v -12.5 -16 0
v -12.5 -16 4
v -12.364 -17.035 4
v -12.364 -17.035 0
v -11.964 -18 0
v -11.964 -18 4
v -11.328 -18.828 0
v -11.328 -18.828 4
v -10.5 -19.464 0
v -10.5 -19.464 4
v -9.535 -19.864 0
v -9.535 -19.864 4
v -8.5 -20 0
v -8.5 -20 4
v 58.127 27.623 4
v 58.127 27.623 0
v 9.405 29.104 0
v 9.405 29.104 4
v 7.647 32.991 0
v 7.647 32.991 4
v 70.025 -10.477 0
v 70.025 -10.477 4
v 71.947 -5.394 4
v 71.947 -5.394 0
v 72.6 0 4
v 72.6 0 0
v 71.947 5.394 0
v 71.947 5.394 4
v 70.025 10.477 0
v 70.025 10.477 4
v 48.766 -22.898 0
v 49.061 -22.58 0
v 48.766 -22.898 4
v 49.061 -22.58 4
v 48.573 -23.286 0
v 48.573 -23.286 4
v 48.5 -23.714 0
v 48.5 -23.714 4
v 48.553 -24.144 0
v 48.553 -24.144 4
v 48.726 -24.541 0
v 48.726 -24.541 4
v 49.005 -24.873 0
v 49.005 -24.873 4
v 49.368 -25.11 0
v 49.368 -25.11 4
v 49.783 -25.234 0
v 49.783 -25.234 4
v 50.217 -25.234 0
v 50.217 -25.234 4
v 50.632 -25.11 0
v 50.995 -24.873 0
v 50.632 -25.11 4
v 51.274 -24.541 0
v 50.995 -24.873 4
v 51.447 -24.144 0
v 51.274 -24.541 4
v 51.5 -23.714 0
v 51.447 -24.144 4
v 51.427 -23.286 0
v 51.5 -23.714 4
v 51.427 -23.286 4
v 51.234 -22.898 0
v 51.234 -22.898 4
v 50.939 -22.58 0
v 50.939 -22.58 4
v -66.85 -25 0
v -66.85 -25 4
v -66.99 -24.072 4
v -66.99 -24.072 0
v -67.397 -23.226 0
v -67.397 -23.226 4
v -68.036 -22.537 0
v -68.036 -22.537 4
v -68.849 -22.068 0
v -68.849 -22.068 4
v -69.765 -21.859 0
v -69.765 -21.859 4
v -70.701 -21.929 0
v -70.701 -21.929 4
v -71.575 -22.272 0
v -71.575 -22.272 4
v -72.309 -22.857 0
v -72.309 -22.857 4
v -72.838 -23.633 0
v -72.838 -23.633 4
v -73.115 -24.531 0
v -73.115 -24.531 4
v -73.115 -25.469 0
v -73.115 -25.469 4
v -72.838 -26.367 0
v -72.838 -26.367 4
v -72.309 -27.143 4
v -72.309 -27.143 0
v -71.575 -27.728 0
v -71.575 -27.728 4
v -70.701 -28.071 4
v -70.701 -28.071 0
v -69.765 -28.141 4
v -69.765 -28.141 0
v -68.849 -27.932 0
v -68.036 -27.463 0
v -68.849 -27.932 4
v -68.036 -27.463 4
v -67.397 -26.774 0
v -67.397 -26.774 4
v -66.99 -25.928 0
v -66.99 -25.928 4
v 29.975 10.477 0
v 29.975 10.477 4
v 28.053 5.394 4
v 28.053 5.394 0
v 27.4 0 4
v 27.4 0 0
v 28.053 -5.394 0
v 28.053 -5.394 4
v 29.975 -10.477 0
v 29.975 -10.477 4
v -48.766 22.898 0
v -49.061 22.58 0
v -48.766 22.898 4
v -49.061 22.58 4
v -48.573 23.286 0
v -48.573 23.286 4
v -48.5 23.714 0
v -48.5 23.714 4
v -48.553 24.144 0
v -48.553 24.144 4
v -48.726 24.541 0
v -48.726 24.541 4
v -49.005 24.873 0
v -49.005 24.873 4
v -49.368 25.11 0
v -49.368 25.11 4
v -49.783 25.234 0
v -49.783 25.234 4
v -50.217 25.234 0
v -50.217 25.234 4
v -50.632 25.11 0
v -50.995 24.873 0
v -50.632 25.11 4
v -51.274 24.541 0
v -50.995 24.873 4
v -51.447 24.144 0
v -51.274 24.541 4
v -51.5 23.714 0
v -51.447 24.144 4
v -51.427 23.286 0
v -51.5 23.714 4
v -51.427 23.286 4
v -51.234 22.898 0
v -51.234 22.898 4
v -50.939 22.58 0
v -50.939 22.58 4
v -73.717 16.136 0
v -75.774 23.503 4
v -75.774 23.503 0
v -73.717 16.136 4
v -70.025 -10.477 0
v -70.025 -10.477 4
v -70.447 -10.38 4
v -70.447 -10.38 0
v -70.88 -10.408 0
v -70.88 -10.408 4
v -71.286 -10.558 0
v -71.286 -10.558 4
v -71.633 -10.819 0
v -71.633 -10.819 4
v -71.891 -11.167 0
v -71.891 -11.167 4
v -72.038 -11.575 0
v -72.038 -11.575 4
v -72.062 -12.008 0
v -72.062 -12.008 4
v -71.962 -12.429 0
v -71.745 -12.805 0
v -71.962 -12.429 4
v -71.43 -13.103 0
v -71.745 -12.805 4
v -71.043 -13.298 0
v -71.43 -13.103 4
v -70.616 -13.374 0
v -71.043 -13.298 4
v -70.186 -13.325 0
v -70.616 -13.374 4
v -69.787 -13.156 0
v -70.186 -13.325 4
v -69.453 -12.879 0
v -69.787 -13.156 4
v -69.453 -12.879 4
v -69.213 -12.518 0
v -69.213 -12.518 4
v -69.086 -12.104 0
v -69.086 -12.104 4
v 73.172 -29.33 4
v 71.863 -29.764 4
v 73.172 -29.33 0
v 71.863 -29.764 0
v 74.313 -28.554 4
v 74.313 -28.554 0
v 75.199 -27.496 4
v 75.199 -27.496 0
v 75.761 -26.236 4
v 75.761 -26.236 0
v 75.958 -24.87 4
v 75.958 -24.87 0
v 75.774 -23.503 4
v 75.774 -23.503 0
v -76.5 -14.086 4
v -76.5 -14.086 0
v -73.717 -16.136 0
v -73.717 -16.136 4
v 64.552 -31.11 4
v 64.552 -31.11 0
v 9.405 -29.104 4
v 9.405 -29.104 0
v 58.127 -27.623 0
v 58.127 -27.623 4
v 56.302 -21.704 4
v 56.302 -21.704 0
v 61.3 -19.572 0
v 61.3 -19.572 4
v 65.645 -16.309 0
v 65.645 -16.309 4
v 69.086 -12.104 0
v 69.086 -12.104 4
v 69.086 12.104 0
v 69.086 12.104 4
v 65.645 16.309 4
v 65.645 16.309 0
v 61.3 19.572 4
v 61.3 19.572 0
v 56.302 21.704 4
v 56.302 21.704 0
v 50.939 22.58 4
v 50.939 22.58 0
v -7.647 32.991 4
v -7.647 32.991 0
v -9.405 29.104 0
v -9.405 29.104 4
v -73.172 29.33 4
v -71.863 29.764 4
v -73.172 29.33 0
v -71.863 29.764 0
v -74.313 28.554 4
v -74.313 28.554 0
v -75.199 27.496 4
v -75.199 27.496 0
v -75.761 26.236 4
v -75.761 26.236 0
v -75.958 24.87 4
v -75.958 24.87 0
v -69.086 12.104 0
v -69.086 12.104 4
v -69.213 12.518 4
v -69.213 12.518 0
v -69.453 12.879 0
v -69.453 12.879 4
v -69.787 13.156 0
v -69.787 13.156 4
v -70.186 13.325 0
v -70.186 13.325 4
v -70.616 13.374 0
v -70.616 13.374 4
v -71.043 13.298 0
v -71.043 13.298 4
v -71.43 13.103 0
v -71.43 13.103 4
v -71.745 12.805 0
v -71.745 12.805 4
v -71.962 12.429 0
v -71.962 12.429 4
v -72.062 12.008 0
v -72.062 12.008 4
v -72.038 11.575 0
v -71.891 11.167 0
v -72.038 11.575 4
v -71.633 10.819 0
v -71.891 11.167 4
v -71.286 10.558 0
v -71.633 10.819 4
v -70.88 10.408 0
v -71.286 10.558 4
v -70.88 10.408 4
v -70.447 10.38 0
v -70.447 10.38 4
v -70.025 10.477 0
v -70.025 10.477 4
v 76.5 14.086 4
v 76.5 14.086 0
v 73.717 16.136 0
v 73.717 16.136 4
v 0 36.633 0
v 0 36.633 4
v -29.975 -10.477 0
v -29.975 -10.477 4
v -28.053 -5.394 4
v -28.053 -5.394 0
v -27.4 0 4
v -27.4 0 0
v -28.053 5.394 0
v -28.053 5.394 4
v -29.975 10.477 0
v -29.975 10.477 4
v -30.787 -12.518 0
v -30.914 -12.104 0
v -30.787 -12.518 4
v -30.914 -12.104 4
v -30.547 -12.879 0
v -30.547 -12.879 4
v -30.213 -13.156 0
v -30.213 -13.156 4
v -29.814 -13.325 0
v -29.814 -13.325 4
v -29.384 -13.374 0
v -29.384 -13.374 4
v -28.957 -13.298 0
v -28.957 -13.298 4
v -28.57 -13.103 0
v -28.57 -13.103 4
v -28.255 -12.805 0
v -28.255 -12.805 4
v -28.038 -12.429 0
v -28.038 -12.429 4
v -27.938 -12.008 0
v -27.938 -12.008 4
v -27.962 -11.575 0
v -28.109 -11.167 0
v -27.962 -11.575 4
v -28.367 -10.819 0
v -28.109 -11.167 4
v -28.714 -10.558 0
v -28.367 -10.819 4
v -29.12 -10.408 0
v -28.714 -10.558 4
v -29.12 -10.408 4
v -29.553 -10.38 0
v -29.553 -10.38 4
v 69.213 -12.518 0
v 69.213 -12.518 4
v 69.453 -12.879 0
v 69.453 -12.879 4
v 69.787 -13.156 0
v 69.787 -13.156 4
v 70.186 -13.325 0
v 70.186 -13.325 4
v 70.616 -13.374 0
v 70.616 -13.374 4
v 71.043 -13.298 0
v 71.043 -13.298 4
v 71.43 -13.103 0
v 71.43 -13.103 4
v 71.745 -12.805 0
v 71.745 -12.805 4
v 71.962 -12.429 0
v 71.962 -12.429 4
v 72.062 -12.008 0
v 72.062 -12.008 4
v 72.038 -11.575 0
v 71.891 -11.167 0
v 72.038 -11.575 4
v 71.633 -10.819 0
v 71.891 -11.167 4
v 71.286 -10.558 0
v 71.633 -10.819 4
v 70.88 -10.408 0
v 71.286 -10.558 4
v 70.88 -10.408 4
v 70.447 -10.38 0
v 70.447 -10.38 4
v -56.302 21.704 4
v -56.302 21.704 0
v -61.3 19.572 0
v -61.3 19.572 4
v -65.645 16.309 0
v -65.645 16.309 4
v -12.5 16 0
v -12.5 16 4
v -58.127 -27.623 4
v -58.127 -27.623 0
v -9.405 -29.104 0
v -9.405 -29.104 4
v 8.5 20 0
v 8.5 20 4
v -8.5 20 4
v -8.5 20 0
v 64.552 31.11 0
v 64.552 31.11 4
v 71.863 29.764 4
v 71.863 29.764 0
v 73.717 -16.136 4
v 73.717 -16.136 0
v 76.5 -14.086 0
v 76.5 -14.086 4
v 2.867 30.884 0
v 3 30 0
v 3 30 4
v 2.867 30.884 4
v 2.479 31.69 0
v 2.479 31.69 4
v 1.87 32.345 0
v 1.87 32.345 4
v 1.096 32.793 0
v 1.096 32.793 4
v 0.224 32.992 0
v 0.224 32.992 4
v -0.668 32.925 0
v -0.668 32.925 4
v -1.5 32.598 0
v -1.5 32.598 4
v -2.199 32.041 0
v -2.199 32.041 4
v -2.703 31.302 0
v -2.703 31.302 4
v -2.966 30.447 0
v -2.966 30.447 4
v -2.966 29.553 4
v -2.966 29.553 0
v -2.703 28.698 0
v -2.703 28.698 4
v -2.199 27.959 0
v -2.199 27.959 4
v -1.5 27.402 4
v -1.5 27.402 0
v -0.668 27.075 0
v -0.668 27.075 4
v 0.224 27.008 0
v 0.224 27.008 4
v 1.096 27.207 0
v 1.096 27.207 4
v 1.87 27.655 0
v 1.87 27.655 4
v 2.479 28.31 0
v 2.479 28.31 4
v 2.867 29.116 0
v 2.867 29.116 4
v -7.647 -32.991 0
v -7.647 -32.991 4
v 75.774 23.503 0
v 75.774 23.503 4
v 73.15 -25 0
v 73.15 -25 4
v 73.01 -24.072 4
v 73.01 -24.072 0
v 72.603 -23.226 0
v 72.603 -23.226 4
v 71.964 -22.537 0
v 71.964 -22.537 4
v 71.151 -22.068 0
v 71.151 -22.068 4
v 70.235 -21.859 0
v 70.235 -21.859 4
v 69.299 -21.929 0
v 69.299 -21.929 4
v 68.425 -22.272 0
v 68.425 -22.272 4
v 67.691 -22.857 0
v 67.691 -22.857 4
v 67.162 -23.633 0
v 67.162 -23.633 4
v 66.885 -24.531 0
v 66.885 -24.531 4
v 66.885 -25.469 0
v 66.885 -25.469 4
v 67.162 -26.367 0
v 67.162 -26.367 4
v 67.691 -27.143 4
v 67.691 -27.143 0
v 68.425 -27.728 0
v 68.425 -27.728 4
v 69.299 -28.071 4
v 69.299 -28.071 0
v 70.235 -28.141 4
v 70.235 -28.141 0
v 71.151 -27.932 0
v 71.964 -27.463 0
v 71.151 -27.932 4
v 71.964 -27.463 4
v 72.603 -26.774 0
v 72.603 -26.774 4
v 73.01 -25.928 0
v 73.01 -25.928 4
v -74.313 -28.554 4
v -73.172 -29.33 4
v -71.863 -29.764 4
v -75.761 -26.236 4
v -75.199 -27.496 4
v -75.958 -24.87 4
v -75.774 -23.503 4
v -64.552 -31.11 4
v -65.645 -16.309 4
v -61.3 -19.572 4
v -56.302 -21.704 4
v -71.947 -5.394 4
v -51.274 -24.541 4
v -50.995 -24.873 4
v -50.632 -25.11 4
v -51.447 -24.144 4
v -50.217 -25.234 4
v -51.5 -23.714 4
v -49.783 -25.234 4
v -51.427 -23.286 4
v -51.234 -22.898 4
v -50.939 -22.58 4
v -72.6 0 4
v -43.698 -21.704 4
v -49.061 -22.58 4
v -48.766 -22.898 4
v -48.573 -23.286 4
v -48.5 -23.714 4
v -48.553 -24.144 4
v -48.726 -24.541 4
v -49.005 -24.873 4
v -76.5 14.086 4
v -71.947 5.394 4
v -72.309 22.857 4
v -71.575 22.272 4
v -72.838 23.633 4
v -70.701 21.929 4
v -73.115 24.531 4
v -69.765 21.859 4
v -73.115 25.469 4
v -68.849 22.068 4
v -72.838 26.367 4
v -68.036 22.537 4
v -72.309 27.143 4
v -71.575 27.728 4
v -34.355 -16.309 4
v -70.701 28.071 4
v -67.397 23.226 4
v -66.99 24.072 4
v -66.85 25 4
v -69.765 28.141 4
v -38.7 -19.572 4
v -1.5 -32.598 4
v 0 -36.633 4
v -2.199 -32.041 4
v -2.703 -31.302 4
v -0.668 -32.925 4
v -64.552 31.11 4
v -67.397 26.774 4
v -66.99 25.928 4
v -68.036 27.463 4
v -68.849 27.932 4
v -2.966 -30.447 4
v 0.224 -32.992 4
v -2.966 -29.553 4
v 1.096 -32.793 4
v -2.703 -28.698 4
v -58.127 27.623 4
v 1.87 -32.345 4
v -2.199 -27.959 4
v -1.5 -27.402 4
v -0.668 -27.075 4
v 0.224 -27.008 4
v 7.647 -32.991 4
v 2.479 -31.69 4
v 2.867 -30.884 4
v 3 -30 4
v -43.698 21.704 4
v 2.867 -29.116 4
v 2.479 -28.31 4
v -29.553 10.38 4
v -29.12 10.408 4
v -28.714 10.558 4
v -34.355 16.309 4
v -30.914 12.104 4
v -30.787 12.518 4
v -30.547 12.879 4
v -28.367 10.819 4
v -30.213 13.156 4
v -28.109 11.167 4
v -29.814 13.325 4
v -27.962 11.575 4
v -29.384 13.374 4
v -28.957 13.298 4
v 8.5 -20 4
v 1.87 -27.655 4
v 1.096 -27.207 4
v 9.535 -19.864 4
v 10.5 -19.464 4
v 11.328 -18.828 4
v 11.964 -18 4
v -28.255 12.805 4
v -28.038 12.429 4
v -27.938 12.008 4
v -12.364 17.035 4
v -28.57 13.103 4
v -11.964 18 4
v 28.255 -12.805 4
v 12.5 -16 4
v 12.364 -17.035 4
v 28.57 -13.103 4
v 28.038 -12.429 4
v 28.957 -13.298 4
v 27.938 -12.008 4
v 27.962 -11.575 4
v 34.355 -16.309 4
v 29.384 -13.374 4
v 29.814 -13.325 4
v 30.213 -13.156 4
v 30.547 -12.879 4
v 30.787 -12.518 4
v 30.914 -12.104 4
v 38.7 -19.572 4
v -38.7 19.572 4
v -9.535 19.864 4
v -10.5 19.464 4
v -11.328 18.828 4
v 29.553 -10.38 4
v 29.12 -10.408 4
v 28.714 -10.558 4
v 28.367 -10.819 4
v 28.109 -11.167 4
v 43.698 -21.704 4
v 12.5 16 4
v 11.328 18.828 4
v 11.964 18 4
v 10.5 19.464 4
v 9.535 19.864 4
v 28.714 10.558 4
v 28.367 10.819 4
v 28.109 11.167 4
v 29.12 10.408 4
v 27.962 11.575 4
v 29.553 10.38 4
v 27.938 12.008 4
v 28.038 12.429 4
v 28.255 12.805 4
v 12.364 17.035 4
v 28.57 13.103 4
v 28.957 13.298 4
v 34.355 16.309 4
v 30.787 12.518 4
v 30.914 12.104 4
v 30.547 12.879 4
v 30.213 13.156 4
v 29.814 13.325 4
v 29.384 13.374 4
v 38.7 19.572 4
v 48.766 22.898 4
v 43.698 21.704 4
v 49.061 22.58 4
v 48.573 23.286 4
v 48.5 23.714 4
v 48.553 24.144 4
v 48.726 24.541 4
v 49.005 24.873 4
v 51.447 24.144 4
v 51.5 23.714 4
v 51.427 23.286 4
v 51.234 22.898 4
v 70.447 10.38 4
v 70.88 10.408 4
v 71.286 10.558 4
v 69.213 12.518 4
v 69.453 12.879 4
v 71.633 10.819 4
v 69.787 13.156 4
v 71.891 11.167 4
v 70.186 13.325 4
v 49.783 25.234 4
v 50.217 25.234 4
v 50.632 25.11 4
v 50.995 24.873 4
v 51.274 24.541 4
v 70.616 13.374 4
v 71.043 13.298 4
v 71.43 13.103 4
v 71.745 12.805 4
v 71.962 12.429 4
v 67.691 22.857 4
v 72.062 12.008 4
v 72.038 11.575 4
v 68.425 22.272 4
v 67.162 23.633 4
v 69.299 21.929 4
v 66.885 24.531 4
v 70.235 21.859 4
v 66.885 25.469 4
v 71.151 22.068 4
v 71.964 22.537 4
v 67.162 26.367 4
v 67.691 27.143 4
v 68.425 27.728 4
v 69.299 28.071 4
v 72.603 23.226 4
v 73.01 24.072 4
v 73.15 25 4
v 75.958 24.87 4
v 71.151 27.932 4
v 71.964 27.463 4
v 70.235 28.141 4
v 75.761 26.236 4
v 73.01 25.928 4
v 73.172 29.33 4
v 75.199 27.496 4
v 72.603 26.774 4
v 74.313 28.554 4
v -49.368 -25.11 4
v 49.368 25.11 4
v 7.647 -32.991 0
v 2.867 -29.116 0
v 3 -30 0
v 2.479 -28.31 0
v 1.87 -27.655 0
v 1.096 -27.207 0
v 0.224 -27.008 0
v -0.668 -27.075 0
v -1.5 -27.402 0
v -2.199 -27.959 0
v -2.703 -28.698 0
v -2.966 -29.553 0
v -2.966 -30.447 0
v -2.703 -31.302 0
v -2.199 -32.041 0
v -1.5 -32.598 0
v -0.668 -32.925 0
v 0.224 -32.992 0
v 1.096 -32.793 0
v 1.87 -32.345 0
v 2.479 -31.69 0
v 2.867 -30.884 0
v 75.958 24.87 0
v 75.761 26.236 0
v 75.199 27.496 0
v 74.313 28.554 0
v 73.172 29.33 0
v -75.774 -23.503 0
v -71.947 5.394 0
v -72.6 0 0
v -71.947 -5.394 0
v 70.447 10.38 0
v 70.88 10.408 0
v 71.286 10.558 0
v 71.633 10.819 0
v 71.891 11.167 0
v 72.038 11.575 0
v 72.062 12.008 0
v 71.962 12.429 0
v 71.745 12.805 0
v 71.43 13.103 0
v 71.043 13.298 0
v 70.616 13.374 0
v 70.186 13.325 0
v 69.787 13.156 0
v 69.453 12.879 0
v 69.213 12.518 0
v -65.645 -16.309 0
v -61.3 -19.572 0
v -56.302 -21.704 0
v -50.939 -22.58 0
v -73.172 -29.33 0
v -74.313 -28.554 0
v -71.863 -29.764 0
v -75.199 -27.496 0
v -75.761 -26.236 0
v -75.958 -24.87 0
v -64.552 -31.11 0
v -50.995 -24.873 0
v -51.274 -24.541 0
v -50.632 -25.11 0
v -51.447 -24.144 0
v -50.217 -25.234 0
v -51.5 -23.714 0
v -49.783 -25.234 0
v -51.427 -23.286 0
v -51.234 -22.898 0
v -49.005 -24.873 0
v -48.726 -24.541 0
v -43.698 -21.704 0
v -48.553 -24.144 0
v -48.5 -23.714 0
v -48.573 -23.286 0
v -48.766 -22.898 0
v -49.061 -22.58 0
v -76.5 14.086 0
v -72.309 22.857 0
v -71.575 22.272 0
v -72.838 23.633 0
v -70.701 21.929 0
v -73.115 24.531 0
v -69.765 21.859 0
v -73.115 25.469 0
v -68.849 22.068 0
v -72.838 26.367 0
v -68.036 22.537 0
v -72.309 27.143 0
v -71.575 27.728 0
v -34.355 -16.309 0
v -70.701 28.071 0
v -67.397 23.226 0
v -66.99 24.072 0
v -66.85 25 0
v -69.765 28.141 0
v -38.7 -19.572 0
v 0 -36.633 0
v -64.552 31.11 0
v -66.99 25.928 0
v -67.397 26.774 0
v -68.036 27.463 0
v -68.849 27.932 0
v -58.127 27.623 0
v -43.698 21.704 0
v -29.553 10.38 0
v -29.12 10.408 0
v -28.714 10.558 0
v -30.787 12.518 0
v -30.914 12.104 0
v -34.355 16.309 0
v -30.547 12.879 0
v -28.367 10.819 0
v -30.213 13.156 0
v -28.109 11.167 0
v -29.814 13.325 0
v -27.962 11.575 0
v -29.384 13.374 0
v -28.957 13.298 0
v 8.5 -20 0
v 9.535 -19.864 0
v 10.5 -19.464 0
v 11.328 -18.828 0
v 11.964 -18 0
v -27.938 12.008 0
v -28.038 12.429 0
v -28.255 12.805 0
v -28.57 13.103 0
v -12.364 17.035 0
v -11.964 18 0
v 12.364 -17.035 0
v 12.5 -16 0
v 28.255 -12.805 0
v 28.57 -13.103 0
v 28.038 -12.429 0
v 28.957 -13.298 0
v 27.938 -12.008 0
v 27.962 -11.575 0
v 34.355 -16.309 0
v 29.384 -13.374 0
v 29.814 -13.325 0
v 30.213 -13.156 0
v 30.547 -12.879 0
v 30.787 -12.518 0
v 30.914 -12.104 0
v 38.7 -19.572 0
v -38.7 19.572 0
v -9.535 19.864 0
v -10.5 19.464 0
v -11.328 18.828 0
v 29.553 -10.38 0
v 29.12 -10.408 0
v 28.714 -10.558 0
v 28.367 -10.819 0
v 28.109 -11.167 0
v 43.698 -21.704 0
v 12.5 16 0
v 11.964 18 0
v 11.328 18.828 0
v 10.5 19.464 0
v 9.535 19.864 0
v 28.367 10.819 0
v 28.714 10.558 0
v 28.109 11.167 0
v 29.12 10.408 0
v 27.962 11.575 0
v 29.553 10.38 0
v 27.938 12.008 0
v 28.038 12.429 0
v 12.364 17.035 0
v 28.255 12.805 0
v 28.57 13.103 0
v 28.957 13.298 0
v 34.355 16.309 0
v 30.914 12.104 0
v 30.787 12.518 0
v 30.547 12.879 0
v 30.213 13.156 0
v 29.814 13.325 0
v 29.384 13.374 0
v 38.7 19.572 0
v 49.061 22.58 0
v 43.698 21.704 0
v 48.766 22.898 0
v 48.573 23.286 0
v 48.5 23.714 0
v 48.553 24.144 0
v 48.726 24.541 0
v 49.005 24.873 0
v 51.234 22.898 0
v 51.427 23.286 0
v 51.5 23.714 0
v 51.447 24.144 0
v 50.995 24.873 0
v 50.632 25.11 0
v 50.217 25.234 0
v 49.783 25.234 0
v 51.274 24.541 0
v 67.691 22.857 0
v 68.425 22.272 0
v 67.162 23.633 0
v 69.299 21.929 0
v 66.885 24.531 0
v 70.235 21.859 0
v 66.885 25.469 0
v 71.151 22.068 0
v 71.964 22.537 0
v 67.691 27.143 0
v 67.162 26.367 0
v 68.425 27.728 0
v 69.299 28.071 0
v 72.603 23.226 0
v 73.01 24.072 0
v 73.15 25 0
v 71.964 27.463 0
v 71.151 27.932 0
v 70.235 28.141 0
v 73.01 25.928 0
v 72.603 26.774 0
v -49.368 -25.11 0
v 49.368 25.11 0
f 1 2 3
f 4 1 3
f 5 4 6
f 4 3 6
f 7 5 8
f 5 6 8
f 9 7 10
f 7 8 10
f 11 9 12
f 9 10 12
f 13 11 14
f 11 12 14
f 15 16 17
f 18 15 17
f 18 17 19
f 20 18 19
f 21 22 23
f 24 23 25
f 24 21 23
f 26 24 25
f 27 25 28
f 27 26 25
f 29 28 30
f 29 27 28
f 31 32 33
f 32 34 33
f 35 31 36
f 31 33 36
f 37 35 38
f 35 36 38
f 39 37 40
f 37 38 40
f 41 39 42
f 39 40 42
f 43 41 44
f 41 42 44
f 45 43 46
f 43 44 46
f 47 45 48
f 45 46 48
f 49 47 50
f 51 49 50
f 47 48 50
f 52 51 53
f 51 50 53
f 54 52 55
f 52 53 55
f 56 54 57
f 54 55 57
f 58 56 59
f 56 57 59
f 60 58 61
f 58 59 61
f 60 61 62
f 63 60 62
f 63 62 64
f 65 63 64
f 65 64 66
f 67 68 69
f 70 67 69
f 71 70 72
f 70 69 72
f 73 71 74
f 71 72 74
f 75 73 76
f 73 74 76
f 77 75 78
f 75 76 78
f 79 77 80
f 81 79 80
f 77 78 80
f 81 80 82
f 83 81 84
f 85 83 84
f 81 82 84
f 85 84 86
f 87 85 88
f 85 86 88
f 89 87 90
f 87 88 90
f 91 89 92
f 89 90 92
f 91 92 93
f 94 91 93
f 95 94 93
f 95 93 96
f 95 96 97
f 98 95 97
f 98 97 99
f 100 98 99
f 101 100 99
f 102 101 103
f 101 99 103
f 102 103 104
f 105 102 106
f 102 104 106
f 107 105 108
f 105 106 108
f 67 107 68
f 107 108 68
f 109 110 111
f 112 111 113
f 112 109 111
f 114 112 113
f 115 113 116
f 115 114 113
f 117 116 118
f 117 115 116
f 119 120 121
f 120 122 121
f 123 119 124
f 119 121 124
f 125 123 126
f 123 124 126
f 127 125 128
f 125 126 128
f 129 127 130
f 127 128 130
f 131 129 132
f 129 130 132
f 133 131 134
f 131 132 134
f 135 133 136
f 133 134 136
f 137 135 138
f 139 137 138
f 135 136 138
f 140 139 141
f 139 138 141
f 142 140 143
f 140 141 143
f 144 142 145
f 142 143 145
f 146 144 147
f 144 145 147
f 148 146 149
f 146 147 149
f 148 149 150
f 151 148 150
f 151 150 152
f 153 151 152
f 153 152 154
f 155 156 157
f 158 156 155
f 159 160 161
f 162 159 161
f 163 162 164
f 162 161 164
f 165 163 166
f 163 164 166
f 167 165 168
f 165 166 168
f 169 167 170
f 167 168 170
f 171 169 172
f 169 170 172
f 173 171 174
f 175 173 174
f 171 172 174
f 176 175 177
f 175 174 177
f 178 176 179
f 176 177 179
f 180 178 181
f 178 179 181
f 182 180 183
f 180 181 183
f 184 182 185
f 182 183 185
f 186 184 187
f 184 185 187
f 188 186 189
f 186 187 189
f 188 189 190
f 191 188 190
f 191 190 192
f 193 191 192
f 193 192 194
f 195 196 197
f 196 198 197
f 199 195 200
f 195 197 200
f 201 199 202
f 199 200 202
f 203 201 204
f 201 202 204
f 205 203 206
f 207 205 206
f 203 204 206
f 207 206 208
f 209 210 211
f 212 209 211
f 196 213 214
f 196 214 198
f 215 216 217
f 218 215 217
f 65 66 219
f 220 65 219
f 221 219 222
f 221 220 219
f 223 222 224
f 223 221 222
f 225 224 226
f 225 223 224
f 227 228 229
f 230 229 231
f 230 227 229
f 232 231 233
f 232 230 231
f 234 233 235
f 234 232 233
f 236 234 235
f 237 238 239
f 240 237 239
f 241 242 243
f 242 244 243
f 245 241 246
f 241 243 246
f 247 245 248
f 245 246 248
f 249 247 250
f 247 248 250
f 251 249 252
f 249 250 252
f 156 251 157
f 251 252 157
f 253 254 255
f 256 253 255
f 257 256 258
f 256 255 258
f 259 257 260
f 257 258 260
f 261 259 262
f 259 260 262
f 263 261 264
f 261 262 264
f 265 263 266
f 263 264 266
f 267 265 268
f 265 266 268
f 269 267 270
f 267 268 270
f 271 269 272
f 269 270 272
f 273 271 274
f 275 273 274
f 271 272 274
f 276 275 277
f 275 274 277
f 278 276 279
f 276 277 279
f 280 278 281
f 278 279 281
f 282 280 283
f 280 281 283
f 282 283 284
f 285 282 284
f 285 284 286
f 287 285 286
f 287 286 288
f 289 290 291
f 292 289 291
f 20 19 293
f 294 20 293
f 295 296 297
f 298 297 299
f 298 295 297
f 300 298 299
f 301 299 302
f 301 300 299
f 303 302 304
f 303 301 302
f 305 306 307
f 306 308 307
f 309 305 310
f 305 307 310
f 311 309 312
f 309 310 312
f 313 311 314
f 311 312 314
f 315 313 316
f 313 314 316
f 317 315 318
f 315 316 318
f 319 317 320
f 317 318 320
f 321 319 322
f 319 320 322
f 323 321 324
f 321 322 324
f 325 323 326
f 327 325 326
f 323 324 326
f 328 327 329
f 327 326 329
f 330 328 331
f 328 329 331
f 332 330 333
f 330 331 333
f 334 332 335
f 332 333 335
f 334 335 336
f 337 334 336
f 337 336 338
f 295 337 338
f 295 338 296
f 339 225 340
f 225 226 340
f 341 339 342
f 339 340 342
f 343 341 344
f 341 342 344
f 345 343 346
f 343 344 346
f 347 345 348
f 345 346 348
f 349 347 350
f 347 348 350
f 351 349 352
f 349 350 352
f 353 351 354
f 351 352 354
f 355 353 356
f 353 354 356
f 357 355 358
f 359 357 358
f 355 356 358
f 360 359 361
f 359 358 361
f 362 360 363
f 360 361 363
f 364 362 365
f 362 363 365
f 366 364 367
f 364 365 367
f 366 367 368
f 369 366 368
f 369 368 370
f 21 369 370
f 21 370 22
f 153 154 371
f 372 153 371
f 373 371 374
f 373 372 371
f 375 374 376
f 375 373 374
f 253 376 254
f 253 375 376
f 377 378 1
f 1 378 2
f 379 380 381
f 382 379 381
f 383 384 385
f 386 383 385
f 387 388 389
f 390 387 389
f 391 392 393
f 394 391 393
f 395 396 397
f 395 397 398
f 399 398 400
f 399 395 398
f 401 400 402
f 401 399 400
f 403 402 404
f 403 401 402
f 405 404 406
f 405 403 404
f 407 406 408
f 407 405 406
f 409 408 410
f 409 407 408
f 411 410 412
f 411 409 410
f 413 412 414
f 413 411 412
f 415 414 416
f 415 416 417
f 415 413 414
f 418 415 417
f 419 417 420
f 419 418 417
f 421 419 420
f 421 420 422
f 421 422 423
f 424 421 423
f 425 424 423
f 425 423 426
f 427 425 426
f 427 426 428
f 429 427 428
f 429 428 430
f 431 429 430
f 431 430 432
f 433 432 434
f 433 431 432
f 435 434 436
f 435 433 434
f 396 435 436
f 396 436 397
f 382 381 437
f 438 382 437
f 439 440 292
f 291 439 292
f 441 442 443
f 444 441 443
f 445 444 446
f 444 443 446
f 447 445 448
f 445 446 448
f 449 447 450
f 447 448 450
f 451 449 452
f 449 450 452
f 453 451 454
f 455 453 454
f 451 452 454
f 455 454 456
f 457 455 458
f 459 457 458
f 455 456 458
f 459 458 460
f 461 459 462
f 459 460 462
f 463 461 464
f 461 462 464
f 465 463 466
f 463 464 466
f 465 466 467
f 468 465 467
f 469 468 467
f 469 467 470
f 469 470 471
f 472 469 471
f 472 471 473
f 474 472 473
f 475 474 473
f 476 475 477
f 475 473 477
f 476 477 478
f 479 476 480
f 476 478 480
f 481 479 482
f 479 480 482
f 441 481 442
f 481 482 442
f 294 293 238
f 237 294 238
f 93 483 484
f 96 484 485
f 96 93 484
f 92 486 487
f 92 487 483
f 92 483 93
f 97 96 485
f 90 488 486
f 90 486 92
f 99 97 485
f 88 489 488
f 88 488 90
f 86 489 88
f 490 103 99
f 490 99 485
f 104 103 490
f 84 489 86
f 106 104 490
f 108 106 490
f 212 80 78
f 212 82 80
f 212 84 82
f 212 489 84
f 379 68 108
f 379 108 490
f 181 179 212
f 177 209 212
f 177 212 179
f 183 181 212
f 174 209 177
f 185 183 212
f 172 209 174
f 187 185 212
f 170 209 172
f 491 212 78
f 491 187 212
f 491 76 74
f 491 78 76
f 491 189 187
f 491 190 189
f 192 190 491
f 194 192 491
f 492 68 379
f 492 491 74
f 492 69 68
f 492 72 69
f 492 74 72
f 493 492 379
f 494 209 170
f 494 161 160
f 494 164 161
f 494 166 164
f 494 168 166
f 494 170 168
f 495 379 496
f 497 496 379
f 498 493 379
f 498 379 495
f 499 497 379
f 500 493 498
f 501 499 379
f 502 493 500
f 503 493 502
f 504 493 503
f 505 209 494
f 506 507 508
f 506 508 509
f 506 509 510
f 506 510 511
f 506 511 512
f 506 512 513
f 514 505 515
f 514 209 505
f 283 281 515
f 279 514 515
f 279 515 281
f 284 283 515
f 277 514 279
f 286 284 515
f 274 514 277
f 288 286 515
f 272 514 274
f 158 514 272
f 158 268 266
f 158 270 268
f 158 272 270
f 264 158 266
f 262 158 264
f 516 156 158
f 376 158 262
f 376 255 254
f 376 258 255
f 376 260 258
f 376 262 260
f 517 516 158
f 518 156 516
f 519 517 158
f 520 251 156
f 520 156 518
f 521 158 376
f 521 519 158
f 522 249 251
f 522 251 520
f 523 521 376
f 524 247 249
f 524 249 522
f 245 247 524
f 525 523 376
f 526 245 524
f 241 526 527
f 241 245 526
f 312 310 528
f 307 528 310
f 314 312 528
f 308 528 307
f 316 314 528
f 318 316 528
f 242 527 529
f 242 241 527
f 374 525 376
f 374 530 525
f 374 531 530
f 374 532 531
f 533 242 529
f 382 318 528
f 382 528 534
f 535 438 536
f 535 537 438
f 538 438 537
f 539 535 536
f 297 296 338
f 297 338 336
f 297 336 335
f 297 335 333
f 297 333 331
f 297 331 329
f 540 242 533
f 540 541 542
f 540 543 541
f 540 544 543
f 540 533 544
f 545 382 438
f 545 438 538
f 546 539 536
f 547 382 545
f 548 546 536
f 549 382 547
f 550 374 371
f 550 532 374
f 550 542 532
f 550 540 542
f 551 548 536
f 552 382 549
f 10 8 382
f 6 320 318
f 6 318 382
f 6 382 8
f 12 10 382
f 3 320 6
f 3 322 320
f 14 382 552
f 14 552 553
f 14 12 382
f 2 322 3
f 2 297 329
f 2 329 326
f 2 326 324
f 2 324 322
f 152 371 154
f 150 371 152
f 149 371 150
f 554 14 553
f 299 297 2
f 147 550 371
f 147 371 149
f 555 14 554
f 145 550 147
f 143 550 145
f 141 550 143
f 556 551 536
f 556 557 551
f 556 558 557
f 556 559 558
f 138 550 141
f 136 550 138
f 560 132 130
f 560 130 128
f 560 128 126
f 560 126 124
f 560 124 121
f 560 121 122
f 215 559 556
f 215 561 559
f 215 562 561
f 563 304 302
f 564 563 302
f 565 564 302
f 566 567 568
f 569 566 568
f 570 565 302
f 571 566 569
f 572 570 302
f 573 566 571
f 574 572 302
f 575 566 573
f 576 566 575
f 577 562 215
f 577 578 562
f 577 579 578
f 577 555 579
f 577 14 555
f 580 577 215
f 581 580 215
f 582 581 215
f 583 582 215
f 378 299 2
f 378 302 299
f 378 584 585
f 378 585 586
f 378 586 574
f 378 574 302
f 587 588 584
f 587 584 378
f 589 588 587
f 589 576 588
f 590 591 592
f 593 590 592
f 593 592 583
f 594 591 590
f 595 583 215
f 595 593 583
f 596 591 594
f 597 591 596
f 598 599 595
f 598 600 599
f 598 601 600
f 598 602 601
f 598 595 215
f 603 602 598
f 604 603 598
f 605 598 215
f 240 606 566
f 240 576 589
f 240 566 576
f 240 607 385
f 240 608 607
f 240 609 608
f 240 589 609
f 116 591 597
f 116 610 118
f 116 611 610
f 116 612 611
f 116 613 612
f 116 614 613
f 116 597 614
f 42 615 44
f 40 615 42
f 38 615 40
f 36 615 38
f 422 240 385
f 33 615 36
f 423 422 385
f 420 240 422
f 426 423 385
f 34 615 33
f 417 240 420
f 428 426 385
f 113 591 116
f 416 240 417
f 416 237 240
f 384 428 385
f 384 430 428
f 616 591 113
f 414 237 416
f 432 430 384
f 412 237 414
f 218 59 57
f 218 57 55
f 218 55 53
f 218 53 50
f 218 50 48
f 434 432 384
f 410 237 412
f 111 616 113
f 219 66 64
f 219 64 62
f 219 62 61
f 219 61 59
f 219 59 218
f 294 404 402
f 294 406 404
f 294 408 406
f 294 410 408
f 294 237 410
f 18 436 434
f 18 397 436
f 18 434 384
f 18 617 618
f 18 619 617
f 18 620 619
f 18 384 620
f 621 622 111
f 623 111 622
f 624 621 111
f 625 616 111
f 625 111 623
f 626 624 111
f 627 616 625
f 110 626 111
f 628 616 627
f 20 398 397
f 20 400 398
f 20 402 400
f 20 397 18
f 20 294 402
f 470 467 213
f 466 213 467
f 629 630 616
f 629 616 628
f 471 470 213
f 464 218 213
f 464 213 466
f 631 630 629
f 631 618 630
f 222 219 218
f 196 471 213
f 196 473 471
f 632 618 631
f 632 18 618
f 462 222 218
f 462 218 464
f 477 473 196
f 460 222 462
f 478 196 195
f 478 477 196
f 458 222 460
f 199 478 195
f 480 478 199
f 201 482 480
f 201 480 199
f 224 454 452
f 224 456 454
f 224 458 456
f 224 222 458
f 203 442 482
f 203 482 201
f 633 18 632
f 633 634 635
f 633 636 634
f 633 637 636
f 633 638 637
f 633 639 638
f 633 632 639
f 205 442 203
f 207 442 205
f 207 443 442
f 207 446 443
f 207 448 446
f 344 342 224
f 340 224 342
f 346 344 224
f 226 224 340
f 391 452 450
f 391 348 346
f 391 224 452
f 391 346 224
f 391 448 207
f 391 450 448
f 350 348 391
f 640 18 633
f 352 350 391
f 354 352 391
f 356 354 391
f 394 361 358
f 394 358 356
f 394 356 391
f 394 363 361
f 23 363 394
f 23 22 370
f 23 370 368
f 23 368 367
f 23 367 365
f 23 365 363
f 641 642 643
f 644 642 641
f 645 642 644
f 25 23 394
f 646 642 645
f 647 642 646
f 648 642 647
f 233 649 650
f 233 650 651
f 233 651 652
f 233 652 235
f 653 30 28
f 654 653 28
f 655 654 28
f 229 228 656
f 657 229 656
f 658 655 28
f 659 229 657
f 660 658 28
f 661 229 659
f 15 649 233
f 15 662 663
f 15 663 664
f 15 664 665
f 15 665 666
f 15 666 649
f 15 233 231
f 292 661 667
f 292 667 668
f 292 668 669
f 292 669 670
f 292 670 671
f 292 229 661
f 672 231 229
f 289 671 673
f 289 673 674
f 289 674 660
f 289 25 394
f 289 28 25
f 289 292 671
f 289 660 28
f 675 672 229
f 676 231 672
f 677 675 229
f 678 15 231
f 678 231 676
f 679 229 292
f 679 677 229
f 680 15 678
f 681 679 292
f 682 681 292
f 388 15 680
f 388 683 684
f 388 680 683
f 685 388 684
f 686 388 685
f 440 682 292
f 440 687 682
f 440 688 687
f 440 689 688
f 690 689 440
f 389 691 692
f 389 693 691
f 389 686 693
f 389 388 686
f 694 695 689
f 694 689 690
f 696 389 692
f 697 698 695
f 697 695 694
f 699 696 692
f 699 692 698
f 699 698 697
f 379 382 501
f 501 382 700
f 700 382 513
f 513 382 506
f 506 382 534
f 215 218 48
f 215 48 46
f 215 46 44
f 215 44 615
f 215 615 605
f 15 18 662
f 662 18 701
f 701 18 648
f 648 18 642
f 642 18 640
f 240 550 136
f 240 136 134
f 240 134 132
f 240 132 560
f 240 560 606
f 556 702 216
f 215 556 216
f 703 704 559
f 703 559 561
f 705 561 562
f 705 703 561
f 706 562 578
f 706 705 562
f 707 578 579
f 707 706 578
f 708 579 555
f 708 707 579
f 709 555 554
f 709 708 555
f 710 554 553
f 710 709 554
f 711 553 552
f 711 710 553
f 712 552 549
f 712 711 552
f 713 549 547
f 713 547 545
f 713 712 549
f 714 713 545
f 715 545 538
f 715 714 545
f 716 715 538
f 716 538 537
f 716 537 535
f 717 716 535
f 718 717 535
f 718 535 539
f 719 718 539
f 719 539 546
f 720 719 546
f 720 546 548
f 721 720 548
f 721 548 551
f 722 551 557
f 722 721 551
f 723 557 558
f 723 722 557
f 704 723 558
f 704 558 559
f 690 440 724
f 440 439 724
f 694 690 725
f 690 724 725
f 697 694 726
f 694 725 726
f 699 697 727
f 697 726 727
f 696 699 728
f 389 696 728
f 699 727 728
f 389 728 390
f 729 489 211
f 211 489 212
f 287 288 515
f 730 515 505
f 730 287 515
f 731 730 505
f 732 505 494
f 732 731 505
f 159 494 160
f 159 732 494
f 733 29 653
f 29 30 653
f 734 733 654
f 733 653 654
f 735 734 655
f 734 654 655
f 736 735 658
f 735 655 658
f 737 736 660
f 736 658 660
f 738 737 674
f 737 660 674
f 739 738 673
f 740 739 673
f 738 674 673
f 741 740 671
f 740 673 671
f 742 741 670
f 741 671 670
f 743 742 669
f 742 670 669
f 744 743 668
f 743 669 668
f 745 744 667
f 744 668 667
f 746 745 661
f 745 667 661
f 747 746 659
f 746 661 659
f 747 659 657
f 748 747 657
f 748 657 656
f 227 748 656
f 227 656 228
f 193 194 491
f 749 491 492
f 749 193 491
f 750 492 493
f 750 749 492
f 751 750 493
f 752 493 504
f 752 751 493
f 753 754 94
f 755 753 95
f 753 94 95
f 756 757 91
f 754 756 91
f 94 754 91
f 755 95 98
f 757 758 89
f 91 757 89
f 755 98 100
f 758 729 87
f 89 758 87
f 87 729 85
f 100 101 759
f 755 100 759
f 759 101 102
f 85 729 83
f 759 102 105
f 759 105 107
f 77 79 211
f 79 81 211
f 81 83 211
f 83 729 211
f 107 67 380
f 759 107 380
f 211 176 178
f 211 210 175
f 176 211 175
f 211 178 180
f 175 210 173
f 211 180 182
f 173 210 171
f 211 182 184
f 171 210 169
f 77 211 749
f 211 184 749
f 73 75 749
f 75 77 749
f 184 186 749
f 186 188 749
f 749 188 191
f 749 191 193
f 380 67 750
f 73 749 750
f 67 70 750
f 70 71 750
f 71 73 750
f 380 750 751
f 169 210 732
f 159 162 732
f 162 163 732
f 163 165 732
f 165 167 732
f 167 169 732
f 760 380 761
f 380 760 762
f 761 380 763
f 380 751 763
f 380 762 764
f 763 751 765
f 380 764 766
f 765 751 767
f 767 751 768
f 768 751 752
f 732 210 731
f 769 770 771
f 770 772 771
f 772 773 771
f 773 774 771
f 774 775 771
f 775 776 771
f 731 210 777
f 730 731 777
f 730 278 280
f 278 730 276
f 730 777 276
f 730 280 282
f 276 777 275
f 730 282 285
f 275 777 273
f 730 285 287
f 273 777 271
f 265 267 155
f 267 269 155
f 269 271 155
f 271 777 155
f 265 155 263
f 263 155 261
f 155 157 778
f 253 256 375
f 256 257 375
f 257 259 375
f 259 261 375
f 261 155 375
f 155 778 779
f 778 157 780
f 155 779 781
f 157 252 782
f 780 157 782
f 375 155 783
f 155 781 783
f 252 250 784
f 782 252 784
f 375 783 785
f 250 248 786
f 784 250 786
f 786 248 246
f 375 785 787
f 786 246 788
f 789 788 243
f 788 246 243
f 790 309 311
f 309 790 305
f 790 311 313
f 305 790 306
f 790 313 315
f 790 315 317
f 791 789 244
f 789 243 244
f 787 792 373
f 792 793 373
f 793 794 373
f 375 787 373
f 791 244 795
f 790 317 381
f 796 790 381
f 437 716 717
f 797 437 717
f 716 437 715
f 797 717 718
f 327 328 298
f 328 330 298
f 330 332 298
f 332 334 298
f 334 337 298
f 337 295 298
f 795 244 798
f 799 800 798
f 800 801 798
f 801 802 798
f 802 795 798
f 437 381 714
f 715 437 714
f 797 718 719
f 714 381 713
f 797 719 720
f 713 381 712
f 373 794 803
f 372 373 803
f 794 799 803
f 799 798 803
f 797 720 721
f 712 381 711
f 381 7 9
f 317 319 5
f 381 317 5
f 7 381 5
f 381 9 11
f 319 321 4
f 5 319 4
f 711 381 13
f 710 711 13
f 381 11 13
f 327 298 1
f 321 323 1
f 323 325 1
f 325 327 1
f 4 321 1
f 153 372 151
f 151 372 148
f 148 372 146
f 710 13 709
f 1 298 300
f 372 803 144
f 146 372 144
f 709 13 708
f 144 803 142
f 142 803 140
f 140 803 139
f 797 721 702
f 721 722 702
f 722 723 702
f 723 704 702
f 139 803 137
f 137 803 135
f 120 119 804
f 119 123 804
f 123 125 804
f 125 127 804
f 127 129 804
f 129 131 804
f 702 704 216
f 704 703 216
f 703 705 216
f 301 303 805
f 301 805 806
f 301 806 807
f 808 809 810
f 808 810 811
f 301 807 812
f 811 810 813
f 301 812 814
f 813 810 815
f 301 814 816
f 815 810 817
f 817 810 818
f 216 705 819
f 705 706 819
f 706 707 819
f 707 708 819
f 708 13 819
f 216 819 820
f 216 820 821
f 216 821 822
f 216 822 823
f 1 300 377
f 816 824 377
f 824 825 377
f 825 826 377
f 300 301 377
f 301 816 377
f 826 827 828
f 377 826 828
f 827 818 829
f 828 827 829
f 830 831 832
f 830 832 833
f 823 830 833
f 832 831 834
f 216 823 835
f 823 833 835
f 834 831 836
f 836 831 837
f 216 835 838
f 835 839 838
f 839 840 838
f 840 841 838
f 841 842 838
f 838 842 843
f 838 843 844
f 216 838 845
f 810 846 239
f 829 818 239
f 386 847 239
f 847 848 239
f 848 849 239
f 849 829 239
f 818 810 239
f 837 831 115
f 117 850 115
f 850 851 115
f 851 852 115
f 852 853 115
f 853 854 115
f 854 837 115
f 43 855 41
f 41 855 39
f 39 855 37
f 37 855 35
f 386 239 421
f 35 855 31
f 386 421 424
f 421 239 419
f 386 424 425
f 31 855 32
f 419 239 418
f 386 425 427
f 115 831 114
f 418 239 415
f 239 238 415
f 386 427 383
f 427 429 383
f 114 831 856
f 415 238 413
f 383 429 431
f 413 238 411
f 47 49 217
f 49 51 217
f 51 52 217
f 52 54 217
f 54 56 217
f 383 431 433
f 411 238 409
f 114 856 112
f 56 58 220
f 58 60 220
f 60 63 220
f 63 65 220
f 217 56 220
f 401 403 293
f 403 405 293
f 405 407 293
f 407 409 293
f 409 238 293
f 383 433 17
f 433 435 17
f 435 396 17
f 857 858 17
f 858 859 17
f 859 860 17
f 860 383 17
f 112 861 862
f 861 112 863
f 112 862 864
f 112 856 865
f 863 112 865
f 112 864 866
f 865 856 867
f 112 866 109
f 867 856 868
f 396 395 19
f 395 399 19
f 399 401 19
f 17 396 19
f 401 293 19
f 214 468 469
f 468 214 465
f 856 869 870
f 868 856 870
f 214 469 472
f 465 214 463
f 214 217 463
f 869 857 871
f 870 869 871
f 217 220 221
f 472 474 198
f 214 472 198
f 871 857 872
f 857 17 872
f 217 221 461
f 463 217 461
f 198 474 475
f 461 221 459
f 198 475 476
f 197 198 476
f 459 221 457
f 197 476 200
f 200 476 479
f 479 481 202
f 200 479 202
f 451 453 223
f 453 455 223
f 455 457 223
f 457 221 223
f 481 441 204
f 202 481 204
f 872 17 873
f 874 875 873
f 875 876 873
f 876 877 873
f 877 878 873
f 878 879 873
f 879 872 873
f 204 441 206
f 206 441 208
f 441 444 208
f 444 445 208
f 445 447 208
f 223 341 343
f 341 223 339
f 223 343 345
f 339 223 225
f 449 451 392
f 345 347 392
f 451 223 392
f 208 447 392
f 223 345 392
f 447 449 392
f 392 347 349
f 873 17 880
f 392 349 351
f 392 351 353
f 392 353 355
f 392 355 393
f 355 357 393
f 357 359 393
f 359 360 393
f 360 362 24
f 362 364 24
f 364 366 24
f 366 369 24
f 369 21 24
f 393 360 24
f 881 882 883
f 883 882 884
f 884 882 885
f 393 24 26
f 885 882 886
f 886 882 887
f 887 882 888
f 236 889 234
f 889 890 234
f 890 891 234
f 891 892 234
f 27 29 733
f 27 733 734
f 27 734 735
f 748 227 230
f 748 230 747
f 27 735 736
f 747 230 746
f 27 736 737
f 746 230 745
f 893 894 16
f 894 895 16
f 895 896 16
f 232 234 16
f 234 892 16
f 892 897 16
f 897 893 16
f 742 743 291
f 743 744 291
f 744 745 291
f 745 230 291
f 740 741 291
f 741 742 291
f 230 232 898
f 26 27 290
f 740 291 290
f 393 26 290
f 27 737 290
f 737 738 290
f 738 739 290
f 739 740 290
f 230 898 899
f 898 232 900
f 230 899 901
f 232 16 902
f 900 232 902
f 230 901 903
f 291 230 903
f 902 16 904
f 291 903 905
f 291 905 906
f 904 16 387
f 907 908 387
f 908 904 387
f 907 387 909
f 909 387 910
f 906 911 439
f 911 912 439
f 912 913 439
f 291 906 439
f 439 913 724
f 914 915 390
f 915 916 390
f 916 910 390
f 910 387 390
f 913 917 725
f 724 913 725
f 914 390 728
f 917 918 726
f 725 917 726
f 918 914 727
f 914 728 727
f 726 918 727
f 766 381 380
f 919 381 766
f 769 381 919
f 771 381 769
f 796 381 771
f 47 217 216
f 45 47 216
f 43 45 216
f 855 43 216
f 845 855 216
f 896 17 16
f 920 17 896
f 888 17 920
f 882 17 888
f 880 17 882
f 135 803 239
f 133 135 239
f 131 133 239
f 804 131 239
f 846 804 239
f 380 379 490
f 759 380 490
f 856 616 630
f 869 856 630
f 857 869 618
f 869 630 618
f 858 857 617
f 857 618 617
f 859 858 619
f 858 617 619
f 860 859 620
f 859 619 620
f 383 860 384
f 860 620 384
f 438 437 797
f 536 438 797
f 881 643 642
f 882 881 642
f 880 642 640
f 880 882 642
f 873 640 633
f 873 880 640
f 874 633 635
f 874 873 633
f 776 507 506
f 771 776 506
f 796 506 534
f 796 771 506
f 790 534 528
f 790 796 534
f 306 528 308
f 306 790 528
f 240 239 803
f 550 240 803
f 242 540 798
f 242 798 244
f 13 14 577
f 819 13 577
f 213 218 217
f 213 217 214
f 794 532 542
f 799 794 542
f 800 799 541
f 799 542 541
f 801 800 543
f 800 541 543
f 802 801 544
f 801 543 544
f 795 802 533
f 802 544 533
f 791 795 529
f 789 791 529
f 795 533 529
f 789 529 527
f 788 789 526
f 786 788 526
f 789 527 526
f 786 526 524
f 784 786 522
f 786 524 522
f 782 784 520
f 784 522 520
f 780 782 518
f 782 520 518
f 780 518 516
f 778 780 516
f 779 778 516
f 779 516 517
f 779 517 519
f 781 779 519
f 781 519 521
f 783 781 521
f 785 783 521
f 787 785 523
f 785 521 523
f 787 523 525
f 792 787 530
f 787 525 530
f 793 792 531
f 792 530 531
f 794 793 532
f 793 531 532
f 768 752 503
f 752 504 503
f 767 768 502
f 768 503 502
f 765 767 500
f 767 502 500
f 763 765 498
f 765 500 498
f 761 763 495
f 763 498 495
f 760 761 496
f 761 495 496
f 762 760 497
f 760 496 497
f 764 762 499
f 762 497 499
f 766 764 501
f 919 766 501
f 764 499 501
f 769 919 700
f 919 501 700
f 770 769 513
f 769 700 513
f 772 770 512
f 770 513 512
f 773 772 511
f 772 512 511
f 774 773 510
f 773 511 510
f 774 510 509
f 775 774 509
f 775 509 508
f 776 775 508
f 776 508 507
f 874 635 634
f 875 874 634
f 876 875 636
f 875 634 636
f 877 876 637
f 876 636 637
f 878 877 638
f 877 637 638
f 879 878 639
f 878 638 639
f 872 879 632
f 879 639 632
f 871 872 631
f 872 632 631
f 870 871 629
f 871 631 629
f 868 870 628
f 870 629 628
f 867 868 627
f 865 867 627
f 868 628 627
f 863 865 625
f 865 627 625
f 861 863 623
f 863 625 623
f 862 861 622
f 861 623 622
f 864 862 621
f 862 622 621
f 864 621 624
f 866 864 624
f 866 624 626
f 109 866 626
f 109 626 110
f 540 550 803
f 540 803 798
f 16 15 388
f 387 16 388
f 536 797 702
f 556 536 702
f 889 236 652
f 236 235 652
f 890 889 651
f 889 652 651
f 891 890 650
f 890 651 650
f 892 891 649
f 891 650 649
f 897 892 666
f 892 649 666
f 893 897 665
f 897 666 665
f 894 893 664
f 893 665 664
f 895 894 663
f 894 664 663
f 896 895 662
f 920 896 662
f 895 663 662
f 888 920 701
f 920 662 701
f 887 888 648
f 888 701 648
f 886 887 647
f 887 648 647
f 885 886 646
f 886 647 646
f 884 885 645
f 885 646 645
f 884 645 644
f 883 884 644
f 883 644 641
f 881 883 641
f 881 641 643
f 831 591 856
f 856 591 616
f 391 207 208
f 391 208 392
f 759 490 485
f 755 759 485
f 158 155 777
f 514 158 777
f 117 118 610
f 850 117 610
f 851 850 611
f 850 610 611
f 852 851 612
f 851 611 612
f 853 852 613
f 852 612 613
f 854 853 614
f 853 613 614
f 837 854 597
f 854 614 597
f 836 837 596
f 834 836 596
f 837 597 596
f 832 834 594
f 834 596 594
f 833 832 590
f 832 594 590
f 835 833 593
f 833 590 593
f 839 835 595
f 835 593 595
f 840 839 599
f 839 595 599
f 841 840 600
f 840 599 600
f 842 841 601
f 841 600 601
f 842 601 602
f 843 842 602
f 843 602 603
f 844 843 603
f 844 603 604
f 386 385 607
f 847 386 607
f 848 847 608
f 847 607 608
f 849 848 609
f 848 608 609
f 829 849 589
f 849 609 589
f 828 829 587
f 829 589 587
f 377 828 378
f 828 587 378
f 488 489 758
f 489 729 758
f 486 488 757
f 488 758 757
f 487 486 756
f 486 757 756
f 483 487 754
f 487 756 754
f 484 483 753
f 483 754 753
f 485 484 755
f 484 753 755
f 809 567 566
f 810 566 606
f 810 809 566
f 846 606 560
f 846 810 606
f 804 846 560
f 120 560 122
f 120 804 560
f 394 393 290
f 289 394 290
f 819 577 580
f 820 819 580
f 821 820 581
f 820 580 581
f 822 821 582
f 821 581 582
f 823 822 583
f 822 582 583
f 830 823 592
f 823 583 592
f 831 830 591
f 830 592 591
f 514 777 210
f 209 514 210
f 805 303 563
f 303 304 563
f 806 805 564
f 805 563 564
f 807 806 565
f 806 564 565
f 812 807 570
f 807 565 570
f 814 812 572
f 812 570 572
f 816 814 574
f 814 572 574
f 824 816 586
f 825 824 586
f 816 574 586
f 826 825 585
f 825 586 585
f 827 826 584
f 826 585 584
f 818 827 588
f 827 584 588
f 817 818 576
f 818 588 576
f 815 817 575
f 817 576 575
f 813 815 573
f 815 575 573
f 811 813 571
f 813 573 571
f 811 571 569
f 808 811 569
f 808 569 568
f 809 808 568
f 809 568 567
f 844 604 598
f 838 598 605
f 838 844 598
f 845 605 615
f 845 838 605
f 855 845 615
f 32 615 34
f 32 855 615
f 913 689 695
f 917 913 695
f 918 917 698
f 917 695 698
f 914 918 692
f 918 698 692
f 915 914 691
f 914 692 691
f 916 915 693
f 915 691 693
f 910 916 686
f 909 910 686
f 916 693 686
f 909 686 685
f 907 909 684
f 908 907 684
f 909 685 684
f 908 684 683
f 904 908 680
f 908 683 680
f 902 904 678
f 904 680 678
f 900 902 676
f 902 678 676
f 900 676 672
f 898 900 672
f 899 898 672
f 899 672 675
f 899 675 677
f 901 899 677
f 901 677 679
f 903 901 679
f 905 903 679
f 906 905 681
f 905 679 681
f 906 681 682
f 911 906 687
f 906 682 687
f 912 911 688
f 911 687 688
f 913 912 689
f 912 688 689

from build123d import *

# Parameters (mm, degrees)
SKETCH1_R           = 3
SKETCH1_R_2         = 22.6
BOSS_EXTRUDE1_DEPTH = 4
CUT_EXTRUDE1_DEPTH  = 5
SKETCH3_R           = 3.15
BOSS_EXTRUDE2_DEPTH = 4
FILLET1_R           = 5
SKETCH4_R           = 1.5
CUT_EXTRUDE2_DEPTH  = 5


with BuildPart() as part:
    # Sketch1 → Boss-Extrude1 (new body)
    with BuildSketch(Plane.XY):
        Polygon((0, 36.632796194), (-7.647271147, 32.990762303), (-9.405300929, 29.104152359), (-58.126981429, 27.62278105), (-76.5, 14.085859857), (-76.5, -14.085859857), (-58.126981429, -27.62278105), (-9.405300929, -29.104152359), (-7.647271147, -32.990762303), (0, -36.632796194), (7.647271147, -32.990762303), (9.405300929, -29.104152359), (58.126981429, -27.62278105), (76.5, -14.085859857), (76.5, 14.085859857), (58.126981429, 27.62278105), (9.405300929, 29.104152359), (7.647271147, 32.990762303), align=None)
        with Locations((0, 30)):
            Circle(SKETCH1_R, mode=Mode.SUBTRACT)
        with Locations((-50, 0)):
            Circle(SKETCH1_R_2, mode=Mode.SUBTRACT)
        with Locations((50, 0)):
            Circle(SKETCH1_R_2, mode=Mode.SUBTRACT)
        with Locations((0, -30)):
            Circle(SKETCH1_R, mode=Mode.SUBTRACT)
    extrude(amount=BOSS_EXTRUDE1_DEPTH)

    # Sketch2 → Cut-Extrude1 (cut, through all)
    with BuildSketch(Plane.XY.offset(4)):
        with BuildLine():
            Line((8.5, 20), (-8.5, 20))
            ThreePointArc((-8.5, 20), (-11.328427125, 18.828427125), (-12.5, 16))
            Line((-12.5, 16), (-12.5, -16))
            ThreePointArc((-12.5, -16), (-11.328427125, -18.828427125), (-8.5, -20))
            Line((-8.5, -20), (8.5, -20))
            ThreePointArc((8.5, -20), (11.328427125, -18.828427125), (12.5, -16))
            Line((12.5, -16), (12.5, 16))
            ThreePointArc((12.5, 16), (11.328427125, 18.828427125), (8.5, 20))
        make_face()
    extrude(amount=-CUT_EXTRUDE1_DEPTH, mode=Mode.SUBTRACT)

    # Sketch3 → Boss-Extrude2 (add)
    with BuildSketch(Plane.XY.offset(4)):
        Polygon((-58.126981429, 27.62278105), (-64.551915182, 31.10998542), (-77.245081729, 28.773819798), (-73.717039059, 16.136297176), align=None)
        with Locations((-70, 25)):
            Circle(SKETCH3_R, mode=Mode.SUBTRACT)
        Polygon((73.717039059, 16.136297176), (58.126981429, 27.62278105), (64.551915182, 31.10998542), (77.245081729, 28.773819798), align=None)
        with Locations((70, 25)):
            Circle(SKETCH3_R, mode=Mode.SUBTRACT)
        Polygon((58.126981429, -27.62278105), (64.551915182, -31.10998542), (77.245081729, -28.773819798), (73.717039059, -16.136297176), align=None)
        with Locations((70, -25)):
            Circle(SKETCH3_R, mode=Mode.SUBTRACT)
        Polygon((-73.717039059, -16.136297176), (-58.126981429, -27.62278105), (-64.551915182, -31.10998542), (-77.245081729, -28.773819798), align=None)
        with Locations((-70, -25)):
            Circle(SKETCH3_R, mode=Mode.SUBTRACT)
    extrude(amount=-BOSS_EXTRUDE2_DEPTH)

    # Fillet1
    fillet1_edges = [part.edges().sort_by_distance(p)[0] for p in [
        (77.245081729, 28.773819798, 2),
        (77.245081729, -28.773819798, 2),
        (-77.245081729, -28.773819798, 2),
        (-77.245081729, 28.773819798, 2),
    ]]
    fillet(fillet1_edges, radius=FILLET1_R)

    # Sketch4 → Cut-Extrude2 (cut, through all)
    with BuildSketch(Plane.XY.offset(4)):
        with Locations((-50, 23.75)):
            Circle(SKETCH4_R)
        with Locations((-70.56810334, 11.875)):
            Circle(SKETCH4_R)
        with Locations((-70.56810334, -11.875)):
            Circle(SKETCH4_R)
        with Locations((-50, -23.75)):
            Circle(SKETCH4_R)
        with Locations((-29.43189666, -11.875)):
            Circle(SKETCH4_R)
        with Locations((-29.43189666, 11.875)):
            Circle(SKETCH4_R)
        with Locations((29.43189666, 11.875)):
            Circle(SKETCH4_R)
        with Locations((29.43189666, -11.875)):
            Circle(SKETCH4_R)
        with Locations((50, -23.75)):
            Circle(SKETCH4_R)
        with Locations((70.56810334, -11.875)):
            Circle(SKETCH4_R)
        with Locations((70.56810334, 11.875)):
            Circle(SKETCH4_R)
        with Locations((50, 23.75)):
            Circle(SKETCH4_R)
    extrude(amount=-CUT_EXTRUDE2_DEPTH, mode=Mode.SUBTRACT)


solid = part.part
